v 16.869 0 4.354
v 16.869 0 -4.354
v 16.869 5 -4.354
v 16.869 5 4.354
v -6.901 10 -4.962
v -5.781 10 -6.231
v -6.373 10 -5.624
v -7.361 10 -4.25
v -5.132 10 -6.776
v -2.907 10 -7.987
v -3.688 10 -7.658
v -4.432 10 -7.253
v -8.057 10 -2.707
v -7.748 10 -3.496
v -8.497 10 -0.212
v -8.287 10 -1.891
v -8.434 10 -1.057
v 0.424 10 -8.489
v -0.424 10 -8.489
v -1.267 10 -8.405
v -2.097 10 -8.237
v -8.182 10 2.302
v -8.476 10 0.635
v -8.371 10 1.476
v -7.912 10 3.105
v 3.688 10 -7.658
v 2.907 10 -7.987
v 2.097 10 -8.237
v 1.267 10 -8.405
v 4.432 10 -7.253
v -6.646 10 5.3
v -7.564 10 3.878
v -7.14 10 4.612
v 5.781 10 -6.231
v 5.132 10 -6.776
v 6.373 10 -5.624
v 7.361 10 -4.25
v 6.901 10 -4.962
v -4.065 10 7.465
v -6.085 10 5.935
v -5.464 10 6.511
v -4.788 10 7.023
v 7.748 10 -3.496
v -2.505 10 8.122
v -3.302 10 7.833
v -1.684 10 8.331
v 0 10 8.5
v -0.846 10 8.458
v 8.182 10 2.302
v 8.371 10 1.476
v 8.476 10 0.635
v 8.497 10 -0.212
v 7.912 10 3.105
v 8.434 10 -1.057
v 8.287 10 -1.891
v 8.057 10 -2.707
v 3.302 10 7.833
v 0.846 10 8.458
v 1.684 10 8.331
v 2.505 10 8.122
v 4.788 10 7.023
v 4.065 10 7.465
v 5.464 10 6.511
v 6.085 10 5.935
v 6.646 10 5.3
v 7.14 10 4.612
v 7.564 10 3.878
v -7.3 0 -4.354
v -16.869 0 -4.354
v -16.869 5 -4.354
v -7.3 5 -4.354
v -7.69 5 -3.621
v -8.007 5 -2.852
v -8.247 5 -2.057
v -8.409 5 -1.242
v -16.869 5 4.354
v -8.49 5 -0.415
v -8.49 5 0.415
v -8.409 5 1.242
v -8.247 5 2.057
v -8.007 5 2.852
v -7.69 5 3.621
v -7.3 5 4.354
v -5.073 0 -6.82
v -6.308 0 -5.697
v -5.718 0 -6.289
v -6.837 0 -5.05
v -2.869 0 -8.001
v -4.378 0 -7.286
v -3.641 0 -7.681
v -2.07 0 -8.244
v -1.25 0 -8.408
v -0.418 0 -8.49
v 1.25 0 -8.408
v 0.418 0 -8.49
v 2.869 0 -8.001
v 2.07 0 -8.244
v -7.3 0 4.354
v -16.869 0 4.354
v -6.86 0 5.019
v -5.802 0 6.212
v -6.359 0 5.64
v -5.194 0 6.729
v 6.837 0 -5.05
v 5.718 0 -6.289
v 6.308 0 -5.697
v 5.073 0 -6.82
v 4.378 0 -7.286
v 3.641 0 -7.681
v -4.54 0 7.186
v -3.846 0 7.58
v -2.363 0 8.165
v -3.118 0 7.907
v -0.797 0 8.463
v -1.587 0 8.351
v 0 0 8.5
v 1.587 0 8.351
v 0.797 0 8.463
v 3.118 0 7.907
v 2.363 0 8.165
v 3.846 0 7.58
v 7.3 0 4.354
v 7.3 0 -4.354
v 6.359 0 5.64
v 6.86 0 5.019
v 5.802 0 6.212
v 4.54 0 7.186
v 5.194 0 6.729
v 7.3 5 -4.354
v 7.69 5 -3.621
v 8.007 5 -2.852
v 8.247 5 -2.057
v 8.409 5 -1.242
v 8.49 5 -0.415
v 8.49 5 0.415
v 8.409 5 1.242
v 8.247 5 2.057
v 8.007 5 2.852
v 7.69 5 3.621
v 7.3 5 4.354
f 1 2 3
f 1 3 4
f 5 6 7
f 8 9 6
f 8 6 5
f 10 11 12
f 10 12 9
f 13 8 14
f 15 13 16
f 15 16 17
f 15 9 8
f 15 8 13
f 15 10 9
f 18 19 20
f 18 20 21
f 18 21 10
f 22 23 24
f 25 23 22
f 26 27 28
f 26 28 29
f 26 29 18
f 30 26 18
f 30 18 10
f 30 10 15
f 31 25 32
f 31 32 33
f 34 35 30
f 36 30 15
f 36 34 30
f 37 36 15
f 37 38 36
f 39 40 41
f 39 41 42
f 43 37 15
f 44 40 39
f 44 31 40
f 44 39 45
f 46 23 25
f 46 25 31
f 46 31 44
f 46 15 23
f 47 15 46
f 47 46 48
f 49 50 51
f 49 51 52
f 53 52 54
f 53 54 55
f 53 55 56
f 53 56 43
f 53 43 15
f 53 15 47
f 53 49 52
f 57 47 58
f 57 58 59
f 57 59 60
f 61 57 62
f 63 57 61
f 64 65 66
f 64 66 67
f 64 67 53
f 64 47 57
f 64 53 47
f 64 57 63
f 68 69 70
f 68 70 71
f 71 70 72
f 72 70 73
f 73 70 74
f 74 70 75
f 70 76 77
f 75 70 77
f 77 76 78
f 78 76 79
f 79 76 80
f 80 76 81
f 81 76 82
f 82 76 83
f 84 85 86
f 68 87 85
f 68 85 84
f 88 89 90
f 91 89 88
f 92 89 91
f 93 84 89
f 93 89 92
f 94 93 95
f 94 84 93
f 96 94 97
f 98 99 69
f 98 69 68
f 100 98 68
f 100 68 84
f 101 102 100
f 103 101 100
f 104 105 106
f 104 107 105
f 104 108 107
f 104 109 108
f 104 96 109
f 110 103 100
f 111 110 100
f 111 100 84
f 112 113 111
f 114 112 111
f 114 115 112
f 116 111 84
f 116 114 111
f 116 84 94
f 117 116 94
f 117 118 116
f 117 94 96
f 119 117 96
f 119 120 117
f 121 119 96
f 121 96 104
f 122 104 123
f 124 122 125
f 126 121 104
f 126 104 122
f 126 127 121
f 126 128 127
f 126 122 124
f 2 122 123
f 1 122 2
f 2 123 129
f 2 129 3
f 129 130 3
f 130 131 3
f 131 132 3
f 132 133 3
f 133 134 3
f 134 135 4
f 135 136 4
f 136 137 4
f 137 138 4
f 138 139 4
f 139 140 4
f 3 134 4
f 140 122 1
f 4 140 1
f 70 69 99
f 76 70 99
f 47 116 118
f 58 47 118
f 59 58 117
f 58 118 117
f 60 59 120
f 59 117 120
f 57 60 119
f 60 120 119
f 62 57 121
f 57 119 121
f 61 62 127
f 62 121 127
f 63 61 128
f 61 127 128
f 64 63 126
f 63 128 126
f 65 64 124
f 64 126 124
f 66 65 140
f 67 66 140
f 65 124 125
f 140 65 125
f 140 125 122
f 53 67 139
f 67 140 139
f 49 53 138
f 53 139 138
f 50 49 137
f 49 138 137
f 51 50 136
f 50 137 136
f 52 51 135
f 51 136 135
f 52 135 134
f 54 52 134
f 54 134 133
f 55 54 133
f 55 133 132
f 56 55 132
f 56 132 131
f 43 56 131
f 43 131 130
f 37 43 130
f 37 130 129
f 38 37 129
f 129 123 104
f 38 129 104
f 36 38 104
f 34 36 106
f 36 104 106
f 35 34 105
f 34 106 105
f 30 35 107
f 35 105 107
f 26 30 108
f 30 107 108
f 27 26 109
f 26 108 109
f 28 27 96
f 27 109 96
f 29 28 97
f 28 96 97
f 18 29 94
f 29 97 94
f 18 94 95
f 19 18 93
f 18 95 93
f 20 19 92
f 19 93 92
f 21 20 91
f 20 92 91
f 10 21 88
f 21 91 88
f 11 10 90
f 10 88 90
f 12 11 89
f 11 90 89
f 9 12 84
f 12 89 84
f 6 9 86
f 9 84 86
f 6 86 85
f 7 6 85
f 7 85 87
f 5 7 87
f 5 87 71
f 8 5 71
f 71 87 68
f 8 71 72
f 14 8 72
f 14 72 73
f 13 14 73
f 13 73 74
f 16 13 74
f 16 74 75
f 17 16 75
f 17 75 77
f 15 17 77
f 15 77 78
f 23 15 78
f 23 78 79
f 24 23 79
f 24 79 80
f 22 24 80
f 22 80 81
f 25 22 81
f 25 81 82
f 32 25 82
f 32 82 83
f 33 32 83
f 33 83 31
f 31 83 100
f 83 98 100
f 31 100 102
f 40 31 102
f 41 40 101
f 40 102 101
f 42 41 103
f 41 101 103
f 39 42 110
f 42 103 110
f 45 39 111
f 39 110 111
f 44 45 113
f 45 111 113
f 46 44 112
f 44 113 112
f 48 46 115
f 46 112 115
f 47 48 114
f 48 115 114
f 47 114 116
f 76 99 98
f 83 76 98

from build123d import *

# Parameters (mm, degrees)
SKETCH1_R           = 8.5
BOSS_EXTRUDE1_DEPTH = 10
SKETCH3_W           = 33.738328928
SKETCH3_H           = 8.707977782
BOSS_EXTRUDE2_DEPTH = 5


with BuildPart() as part:
    # Sketch1 → Boss-Extrude1 (new body)
    with BuildSketch(Plane(origin=(0, 0, 0), x_dir=(1, 0, 0), z_dir=(0, 1, 0))):
        with Locations(Location((0, 0, 0), (0, 0, 270))):
            Circle(SKETCH1_R)
    extrude(amount=BOSS_EXTRUDE1_DEPTH)

    # Sketch3 → Boss-Extrude2 (add)
    with BuildSketch(Plane.XZ):
        Rectangle(SKETCH3_W, SKETCH3_H)
    extrude(amount=-BOSS_EXTRUDE2_DEPTH)


solid = part.part
